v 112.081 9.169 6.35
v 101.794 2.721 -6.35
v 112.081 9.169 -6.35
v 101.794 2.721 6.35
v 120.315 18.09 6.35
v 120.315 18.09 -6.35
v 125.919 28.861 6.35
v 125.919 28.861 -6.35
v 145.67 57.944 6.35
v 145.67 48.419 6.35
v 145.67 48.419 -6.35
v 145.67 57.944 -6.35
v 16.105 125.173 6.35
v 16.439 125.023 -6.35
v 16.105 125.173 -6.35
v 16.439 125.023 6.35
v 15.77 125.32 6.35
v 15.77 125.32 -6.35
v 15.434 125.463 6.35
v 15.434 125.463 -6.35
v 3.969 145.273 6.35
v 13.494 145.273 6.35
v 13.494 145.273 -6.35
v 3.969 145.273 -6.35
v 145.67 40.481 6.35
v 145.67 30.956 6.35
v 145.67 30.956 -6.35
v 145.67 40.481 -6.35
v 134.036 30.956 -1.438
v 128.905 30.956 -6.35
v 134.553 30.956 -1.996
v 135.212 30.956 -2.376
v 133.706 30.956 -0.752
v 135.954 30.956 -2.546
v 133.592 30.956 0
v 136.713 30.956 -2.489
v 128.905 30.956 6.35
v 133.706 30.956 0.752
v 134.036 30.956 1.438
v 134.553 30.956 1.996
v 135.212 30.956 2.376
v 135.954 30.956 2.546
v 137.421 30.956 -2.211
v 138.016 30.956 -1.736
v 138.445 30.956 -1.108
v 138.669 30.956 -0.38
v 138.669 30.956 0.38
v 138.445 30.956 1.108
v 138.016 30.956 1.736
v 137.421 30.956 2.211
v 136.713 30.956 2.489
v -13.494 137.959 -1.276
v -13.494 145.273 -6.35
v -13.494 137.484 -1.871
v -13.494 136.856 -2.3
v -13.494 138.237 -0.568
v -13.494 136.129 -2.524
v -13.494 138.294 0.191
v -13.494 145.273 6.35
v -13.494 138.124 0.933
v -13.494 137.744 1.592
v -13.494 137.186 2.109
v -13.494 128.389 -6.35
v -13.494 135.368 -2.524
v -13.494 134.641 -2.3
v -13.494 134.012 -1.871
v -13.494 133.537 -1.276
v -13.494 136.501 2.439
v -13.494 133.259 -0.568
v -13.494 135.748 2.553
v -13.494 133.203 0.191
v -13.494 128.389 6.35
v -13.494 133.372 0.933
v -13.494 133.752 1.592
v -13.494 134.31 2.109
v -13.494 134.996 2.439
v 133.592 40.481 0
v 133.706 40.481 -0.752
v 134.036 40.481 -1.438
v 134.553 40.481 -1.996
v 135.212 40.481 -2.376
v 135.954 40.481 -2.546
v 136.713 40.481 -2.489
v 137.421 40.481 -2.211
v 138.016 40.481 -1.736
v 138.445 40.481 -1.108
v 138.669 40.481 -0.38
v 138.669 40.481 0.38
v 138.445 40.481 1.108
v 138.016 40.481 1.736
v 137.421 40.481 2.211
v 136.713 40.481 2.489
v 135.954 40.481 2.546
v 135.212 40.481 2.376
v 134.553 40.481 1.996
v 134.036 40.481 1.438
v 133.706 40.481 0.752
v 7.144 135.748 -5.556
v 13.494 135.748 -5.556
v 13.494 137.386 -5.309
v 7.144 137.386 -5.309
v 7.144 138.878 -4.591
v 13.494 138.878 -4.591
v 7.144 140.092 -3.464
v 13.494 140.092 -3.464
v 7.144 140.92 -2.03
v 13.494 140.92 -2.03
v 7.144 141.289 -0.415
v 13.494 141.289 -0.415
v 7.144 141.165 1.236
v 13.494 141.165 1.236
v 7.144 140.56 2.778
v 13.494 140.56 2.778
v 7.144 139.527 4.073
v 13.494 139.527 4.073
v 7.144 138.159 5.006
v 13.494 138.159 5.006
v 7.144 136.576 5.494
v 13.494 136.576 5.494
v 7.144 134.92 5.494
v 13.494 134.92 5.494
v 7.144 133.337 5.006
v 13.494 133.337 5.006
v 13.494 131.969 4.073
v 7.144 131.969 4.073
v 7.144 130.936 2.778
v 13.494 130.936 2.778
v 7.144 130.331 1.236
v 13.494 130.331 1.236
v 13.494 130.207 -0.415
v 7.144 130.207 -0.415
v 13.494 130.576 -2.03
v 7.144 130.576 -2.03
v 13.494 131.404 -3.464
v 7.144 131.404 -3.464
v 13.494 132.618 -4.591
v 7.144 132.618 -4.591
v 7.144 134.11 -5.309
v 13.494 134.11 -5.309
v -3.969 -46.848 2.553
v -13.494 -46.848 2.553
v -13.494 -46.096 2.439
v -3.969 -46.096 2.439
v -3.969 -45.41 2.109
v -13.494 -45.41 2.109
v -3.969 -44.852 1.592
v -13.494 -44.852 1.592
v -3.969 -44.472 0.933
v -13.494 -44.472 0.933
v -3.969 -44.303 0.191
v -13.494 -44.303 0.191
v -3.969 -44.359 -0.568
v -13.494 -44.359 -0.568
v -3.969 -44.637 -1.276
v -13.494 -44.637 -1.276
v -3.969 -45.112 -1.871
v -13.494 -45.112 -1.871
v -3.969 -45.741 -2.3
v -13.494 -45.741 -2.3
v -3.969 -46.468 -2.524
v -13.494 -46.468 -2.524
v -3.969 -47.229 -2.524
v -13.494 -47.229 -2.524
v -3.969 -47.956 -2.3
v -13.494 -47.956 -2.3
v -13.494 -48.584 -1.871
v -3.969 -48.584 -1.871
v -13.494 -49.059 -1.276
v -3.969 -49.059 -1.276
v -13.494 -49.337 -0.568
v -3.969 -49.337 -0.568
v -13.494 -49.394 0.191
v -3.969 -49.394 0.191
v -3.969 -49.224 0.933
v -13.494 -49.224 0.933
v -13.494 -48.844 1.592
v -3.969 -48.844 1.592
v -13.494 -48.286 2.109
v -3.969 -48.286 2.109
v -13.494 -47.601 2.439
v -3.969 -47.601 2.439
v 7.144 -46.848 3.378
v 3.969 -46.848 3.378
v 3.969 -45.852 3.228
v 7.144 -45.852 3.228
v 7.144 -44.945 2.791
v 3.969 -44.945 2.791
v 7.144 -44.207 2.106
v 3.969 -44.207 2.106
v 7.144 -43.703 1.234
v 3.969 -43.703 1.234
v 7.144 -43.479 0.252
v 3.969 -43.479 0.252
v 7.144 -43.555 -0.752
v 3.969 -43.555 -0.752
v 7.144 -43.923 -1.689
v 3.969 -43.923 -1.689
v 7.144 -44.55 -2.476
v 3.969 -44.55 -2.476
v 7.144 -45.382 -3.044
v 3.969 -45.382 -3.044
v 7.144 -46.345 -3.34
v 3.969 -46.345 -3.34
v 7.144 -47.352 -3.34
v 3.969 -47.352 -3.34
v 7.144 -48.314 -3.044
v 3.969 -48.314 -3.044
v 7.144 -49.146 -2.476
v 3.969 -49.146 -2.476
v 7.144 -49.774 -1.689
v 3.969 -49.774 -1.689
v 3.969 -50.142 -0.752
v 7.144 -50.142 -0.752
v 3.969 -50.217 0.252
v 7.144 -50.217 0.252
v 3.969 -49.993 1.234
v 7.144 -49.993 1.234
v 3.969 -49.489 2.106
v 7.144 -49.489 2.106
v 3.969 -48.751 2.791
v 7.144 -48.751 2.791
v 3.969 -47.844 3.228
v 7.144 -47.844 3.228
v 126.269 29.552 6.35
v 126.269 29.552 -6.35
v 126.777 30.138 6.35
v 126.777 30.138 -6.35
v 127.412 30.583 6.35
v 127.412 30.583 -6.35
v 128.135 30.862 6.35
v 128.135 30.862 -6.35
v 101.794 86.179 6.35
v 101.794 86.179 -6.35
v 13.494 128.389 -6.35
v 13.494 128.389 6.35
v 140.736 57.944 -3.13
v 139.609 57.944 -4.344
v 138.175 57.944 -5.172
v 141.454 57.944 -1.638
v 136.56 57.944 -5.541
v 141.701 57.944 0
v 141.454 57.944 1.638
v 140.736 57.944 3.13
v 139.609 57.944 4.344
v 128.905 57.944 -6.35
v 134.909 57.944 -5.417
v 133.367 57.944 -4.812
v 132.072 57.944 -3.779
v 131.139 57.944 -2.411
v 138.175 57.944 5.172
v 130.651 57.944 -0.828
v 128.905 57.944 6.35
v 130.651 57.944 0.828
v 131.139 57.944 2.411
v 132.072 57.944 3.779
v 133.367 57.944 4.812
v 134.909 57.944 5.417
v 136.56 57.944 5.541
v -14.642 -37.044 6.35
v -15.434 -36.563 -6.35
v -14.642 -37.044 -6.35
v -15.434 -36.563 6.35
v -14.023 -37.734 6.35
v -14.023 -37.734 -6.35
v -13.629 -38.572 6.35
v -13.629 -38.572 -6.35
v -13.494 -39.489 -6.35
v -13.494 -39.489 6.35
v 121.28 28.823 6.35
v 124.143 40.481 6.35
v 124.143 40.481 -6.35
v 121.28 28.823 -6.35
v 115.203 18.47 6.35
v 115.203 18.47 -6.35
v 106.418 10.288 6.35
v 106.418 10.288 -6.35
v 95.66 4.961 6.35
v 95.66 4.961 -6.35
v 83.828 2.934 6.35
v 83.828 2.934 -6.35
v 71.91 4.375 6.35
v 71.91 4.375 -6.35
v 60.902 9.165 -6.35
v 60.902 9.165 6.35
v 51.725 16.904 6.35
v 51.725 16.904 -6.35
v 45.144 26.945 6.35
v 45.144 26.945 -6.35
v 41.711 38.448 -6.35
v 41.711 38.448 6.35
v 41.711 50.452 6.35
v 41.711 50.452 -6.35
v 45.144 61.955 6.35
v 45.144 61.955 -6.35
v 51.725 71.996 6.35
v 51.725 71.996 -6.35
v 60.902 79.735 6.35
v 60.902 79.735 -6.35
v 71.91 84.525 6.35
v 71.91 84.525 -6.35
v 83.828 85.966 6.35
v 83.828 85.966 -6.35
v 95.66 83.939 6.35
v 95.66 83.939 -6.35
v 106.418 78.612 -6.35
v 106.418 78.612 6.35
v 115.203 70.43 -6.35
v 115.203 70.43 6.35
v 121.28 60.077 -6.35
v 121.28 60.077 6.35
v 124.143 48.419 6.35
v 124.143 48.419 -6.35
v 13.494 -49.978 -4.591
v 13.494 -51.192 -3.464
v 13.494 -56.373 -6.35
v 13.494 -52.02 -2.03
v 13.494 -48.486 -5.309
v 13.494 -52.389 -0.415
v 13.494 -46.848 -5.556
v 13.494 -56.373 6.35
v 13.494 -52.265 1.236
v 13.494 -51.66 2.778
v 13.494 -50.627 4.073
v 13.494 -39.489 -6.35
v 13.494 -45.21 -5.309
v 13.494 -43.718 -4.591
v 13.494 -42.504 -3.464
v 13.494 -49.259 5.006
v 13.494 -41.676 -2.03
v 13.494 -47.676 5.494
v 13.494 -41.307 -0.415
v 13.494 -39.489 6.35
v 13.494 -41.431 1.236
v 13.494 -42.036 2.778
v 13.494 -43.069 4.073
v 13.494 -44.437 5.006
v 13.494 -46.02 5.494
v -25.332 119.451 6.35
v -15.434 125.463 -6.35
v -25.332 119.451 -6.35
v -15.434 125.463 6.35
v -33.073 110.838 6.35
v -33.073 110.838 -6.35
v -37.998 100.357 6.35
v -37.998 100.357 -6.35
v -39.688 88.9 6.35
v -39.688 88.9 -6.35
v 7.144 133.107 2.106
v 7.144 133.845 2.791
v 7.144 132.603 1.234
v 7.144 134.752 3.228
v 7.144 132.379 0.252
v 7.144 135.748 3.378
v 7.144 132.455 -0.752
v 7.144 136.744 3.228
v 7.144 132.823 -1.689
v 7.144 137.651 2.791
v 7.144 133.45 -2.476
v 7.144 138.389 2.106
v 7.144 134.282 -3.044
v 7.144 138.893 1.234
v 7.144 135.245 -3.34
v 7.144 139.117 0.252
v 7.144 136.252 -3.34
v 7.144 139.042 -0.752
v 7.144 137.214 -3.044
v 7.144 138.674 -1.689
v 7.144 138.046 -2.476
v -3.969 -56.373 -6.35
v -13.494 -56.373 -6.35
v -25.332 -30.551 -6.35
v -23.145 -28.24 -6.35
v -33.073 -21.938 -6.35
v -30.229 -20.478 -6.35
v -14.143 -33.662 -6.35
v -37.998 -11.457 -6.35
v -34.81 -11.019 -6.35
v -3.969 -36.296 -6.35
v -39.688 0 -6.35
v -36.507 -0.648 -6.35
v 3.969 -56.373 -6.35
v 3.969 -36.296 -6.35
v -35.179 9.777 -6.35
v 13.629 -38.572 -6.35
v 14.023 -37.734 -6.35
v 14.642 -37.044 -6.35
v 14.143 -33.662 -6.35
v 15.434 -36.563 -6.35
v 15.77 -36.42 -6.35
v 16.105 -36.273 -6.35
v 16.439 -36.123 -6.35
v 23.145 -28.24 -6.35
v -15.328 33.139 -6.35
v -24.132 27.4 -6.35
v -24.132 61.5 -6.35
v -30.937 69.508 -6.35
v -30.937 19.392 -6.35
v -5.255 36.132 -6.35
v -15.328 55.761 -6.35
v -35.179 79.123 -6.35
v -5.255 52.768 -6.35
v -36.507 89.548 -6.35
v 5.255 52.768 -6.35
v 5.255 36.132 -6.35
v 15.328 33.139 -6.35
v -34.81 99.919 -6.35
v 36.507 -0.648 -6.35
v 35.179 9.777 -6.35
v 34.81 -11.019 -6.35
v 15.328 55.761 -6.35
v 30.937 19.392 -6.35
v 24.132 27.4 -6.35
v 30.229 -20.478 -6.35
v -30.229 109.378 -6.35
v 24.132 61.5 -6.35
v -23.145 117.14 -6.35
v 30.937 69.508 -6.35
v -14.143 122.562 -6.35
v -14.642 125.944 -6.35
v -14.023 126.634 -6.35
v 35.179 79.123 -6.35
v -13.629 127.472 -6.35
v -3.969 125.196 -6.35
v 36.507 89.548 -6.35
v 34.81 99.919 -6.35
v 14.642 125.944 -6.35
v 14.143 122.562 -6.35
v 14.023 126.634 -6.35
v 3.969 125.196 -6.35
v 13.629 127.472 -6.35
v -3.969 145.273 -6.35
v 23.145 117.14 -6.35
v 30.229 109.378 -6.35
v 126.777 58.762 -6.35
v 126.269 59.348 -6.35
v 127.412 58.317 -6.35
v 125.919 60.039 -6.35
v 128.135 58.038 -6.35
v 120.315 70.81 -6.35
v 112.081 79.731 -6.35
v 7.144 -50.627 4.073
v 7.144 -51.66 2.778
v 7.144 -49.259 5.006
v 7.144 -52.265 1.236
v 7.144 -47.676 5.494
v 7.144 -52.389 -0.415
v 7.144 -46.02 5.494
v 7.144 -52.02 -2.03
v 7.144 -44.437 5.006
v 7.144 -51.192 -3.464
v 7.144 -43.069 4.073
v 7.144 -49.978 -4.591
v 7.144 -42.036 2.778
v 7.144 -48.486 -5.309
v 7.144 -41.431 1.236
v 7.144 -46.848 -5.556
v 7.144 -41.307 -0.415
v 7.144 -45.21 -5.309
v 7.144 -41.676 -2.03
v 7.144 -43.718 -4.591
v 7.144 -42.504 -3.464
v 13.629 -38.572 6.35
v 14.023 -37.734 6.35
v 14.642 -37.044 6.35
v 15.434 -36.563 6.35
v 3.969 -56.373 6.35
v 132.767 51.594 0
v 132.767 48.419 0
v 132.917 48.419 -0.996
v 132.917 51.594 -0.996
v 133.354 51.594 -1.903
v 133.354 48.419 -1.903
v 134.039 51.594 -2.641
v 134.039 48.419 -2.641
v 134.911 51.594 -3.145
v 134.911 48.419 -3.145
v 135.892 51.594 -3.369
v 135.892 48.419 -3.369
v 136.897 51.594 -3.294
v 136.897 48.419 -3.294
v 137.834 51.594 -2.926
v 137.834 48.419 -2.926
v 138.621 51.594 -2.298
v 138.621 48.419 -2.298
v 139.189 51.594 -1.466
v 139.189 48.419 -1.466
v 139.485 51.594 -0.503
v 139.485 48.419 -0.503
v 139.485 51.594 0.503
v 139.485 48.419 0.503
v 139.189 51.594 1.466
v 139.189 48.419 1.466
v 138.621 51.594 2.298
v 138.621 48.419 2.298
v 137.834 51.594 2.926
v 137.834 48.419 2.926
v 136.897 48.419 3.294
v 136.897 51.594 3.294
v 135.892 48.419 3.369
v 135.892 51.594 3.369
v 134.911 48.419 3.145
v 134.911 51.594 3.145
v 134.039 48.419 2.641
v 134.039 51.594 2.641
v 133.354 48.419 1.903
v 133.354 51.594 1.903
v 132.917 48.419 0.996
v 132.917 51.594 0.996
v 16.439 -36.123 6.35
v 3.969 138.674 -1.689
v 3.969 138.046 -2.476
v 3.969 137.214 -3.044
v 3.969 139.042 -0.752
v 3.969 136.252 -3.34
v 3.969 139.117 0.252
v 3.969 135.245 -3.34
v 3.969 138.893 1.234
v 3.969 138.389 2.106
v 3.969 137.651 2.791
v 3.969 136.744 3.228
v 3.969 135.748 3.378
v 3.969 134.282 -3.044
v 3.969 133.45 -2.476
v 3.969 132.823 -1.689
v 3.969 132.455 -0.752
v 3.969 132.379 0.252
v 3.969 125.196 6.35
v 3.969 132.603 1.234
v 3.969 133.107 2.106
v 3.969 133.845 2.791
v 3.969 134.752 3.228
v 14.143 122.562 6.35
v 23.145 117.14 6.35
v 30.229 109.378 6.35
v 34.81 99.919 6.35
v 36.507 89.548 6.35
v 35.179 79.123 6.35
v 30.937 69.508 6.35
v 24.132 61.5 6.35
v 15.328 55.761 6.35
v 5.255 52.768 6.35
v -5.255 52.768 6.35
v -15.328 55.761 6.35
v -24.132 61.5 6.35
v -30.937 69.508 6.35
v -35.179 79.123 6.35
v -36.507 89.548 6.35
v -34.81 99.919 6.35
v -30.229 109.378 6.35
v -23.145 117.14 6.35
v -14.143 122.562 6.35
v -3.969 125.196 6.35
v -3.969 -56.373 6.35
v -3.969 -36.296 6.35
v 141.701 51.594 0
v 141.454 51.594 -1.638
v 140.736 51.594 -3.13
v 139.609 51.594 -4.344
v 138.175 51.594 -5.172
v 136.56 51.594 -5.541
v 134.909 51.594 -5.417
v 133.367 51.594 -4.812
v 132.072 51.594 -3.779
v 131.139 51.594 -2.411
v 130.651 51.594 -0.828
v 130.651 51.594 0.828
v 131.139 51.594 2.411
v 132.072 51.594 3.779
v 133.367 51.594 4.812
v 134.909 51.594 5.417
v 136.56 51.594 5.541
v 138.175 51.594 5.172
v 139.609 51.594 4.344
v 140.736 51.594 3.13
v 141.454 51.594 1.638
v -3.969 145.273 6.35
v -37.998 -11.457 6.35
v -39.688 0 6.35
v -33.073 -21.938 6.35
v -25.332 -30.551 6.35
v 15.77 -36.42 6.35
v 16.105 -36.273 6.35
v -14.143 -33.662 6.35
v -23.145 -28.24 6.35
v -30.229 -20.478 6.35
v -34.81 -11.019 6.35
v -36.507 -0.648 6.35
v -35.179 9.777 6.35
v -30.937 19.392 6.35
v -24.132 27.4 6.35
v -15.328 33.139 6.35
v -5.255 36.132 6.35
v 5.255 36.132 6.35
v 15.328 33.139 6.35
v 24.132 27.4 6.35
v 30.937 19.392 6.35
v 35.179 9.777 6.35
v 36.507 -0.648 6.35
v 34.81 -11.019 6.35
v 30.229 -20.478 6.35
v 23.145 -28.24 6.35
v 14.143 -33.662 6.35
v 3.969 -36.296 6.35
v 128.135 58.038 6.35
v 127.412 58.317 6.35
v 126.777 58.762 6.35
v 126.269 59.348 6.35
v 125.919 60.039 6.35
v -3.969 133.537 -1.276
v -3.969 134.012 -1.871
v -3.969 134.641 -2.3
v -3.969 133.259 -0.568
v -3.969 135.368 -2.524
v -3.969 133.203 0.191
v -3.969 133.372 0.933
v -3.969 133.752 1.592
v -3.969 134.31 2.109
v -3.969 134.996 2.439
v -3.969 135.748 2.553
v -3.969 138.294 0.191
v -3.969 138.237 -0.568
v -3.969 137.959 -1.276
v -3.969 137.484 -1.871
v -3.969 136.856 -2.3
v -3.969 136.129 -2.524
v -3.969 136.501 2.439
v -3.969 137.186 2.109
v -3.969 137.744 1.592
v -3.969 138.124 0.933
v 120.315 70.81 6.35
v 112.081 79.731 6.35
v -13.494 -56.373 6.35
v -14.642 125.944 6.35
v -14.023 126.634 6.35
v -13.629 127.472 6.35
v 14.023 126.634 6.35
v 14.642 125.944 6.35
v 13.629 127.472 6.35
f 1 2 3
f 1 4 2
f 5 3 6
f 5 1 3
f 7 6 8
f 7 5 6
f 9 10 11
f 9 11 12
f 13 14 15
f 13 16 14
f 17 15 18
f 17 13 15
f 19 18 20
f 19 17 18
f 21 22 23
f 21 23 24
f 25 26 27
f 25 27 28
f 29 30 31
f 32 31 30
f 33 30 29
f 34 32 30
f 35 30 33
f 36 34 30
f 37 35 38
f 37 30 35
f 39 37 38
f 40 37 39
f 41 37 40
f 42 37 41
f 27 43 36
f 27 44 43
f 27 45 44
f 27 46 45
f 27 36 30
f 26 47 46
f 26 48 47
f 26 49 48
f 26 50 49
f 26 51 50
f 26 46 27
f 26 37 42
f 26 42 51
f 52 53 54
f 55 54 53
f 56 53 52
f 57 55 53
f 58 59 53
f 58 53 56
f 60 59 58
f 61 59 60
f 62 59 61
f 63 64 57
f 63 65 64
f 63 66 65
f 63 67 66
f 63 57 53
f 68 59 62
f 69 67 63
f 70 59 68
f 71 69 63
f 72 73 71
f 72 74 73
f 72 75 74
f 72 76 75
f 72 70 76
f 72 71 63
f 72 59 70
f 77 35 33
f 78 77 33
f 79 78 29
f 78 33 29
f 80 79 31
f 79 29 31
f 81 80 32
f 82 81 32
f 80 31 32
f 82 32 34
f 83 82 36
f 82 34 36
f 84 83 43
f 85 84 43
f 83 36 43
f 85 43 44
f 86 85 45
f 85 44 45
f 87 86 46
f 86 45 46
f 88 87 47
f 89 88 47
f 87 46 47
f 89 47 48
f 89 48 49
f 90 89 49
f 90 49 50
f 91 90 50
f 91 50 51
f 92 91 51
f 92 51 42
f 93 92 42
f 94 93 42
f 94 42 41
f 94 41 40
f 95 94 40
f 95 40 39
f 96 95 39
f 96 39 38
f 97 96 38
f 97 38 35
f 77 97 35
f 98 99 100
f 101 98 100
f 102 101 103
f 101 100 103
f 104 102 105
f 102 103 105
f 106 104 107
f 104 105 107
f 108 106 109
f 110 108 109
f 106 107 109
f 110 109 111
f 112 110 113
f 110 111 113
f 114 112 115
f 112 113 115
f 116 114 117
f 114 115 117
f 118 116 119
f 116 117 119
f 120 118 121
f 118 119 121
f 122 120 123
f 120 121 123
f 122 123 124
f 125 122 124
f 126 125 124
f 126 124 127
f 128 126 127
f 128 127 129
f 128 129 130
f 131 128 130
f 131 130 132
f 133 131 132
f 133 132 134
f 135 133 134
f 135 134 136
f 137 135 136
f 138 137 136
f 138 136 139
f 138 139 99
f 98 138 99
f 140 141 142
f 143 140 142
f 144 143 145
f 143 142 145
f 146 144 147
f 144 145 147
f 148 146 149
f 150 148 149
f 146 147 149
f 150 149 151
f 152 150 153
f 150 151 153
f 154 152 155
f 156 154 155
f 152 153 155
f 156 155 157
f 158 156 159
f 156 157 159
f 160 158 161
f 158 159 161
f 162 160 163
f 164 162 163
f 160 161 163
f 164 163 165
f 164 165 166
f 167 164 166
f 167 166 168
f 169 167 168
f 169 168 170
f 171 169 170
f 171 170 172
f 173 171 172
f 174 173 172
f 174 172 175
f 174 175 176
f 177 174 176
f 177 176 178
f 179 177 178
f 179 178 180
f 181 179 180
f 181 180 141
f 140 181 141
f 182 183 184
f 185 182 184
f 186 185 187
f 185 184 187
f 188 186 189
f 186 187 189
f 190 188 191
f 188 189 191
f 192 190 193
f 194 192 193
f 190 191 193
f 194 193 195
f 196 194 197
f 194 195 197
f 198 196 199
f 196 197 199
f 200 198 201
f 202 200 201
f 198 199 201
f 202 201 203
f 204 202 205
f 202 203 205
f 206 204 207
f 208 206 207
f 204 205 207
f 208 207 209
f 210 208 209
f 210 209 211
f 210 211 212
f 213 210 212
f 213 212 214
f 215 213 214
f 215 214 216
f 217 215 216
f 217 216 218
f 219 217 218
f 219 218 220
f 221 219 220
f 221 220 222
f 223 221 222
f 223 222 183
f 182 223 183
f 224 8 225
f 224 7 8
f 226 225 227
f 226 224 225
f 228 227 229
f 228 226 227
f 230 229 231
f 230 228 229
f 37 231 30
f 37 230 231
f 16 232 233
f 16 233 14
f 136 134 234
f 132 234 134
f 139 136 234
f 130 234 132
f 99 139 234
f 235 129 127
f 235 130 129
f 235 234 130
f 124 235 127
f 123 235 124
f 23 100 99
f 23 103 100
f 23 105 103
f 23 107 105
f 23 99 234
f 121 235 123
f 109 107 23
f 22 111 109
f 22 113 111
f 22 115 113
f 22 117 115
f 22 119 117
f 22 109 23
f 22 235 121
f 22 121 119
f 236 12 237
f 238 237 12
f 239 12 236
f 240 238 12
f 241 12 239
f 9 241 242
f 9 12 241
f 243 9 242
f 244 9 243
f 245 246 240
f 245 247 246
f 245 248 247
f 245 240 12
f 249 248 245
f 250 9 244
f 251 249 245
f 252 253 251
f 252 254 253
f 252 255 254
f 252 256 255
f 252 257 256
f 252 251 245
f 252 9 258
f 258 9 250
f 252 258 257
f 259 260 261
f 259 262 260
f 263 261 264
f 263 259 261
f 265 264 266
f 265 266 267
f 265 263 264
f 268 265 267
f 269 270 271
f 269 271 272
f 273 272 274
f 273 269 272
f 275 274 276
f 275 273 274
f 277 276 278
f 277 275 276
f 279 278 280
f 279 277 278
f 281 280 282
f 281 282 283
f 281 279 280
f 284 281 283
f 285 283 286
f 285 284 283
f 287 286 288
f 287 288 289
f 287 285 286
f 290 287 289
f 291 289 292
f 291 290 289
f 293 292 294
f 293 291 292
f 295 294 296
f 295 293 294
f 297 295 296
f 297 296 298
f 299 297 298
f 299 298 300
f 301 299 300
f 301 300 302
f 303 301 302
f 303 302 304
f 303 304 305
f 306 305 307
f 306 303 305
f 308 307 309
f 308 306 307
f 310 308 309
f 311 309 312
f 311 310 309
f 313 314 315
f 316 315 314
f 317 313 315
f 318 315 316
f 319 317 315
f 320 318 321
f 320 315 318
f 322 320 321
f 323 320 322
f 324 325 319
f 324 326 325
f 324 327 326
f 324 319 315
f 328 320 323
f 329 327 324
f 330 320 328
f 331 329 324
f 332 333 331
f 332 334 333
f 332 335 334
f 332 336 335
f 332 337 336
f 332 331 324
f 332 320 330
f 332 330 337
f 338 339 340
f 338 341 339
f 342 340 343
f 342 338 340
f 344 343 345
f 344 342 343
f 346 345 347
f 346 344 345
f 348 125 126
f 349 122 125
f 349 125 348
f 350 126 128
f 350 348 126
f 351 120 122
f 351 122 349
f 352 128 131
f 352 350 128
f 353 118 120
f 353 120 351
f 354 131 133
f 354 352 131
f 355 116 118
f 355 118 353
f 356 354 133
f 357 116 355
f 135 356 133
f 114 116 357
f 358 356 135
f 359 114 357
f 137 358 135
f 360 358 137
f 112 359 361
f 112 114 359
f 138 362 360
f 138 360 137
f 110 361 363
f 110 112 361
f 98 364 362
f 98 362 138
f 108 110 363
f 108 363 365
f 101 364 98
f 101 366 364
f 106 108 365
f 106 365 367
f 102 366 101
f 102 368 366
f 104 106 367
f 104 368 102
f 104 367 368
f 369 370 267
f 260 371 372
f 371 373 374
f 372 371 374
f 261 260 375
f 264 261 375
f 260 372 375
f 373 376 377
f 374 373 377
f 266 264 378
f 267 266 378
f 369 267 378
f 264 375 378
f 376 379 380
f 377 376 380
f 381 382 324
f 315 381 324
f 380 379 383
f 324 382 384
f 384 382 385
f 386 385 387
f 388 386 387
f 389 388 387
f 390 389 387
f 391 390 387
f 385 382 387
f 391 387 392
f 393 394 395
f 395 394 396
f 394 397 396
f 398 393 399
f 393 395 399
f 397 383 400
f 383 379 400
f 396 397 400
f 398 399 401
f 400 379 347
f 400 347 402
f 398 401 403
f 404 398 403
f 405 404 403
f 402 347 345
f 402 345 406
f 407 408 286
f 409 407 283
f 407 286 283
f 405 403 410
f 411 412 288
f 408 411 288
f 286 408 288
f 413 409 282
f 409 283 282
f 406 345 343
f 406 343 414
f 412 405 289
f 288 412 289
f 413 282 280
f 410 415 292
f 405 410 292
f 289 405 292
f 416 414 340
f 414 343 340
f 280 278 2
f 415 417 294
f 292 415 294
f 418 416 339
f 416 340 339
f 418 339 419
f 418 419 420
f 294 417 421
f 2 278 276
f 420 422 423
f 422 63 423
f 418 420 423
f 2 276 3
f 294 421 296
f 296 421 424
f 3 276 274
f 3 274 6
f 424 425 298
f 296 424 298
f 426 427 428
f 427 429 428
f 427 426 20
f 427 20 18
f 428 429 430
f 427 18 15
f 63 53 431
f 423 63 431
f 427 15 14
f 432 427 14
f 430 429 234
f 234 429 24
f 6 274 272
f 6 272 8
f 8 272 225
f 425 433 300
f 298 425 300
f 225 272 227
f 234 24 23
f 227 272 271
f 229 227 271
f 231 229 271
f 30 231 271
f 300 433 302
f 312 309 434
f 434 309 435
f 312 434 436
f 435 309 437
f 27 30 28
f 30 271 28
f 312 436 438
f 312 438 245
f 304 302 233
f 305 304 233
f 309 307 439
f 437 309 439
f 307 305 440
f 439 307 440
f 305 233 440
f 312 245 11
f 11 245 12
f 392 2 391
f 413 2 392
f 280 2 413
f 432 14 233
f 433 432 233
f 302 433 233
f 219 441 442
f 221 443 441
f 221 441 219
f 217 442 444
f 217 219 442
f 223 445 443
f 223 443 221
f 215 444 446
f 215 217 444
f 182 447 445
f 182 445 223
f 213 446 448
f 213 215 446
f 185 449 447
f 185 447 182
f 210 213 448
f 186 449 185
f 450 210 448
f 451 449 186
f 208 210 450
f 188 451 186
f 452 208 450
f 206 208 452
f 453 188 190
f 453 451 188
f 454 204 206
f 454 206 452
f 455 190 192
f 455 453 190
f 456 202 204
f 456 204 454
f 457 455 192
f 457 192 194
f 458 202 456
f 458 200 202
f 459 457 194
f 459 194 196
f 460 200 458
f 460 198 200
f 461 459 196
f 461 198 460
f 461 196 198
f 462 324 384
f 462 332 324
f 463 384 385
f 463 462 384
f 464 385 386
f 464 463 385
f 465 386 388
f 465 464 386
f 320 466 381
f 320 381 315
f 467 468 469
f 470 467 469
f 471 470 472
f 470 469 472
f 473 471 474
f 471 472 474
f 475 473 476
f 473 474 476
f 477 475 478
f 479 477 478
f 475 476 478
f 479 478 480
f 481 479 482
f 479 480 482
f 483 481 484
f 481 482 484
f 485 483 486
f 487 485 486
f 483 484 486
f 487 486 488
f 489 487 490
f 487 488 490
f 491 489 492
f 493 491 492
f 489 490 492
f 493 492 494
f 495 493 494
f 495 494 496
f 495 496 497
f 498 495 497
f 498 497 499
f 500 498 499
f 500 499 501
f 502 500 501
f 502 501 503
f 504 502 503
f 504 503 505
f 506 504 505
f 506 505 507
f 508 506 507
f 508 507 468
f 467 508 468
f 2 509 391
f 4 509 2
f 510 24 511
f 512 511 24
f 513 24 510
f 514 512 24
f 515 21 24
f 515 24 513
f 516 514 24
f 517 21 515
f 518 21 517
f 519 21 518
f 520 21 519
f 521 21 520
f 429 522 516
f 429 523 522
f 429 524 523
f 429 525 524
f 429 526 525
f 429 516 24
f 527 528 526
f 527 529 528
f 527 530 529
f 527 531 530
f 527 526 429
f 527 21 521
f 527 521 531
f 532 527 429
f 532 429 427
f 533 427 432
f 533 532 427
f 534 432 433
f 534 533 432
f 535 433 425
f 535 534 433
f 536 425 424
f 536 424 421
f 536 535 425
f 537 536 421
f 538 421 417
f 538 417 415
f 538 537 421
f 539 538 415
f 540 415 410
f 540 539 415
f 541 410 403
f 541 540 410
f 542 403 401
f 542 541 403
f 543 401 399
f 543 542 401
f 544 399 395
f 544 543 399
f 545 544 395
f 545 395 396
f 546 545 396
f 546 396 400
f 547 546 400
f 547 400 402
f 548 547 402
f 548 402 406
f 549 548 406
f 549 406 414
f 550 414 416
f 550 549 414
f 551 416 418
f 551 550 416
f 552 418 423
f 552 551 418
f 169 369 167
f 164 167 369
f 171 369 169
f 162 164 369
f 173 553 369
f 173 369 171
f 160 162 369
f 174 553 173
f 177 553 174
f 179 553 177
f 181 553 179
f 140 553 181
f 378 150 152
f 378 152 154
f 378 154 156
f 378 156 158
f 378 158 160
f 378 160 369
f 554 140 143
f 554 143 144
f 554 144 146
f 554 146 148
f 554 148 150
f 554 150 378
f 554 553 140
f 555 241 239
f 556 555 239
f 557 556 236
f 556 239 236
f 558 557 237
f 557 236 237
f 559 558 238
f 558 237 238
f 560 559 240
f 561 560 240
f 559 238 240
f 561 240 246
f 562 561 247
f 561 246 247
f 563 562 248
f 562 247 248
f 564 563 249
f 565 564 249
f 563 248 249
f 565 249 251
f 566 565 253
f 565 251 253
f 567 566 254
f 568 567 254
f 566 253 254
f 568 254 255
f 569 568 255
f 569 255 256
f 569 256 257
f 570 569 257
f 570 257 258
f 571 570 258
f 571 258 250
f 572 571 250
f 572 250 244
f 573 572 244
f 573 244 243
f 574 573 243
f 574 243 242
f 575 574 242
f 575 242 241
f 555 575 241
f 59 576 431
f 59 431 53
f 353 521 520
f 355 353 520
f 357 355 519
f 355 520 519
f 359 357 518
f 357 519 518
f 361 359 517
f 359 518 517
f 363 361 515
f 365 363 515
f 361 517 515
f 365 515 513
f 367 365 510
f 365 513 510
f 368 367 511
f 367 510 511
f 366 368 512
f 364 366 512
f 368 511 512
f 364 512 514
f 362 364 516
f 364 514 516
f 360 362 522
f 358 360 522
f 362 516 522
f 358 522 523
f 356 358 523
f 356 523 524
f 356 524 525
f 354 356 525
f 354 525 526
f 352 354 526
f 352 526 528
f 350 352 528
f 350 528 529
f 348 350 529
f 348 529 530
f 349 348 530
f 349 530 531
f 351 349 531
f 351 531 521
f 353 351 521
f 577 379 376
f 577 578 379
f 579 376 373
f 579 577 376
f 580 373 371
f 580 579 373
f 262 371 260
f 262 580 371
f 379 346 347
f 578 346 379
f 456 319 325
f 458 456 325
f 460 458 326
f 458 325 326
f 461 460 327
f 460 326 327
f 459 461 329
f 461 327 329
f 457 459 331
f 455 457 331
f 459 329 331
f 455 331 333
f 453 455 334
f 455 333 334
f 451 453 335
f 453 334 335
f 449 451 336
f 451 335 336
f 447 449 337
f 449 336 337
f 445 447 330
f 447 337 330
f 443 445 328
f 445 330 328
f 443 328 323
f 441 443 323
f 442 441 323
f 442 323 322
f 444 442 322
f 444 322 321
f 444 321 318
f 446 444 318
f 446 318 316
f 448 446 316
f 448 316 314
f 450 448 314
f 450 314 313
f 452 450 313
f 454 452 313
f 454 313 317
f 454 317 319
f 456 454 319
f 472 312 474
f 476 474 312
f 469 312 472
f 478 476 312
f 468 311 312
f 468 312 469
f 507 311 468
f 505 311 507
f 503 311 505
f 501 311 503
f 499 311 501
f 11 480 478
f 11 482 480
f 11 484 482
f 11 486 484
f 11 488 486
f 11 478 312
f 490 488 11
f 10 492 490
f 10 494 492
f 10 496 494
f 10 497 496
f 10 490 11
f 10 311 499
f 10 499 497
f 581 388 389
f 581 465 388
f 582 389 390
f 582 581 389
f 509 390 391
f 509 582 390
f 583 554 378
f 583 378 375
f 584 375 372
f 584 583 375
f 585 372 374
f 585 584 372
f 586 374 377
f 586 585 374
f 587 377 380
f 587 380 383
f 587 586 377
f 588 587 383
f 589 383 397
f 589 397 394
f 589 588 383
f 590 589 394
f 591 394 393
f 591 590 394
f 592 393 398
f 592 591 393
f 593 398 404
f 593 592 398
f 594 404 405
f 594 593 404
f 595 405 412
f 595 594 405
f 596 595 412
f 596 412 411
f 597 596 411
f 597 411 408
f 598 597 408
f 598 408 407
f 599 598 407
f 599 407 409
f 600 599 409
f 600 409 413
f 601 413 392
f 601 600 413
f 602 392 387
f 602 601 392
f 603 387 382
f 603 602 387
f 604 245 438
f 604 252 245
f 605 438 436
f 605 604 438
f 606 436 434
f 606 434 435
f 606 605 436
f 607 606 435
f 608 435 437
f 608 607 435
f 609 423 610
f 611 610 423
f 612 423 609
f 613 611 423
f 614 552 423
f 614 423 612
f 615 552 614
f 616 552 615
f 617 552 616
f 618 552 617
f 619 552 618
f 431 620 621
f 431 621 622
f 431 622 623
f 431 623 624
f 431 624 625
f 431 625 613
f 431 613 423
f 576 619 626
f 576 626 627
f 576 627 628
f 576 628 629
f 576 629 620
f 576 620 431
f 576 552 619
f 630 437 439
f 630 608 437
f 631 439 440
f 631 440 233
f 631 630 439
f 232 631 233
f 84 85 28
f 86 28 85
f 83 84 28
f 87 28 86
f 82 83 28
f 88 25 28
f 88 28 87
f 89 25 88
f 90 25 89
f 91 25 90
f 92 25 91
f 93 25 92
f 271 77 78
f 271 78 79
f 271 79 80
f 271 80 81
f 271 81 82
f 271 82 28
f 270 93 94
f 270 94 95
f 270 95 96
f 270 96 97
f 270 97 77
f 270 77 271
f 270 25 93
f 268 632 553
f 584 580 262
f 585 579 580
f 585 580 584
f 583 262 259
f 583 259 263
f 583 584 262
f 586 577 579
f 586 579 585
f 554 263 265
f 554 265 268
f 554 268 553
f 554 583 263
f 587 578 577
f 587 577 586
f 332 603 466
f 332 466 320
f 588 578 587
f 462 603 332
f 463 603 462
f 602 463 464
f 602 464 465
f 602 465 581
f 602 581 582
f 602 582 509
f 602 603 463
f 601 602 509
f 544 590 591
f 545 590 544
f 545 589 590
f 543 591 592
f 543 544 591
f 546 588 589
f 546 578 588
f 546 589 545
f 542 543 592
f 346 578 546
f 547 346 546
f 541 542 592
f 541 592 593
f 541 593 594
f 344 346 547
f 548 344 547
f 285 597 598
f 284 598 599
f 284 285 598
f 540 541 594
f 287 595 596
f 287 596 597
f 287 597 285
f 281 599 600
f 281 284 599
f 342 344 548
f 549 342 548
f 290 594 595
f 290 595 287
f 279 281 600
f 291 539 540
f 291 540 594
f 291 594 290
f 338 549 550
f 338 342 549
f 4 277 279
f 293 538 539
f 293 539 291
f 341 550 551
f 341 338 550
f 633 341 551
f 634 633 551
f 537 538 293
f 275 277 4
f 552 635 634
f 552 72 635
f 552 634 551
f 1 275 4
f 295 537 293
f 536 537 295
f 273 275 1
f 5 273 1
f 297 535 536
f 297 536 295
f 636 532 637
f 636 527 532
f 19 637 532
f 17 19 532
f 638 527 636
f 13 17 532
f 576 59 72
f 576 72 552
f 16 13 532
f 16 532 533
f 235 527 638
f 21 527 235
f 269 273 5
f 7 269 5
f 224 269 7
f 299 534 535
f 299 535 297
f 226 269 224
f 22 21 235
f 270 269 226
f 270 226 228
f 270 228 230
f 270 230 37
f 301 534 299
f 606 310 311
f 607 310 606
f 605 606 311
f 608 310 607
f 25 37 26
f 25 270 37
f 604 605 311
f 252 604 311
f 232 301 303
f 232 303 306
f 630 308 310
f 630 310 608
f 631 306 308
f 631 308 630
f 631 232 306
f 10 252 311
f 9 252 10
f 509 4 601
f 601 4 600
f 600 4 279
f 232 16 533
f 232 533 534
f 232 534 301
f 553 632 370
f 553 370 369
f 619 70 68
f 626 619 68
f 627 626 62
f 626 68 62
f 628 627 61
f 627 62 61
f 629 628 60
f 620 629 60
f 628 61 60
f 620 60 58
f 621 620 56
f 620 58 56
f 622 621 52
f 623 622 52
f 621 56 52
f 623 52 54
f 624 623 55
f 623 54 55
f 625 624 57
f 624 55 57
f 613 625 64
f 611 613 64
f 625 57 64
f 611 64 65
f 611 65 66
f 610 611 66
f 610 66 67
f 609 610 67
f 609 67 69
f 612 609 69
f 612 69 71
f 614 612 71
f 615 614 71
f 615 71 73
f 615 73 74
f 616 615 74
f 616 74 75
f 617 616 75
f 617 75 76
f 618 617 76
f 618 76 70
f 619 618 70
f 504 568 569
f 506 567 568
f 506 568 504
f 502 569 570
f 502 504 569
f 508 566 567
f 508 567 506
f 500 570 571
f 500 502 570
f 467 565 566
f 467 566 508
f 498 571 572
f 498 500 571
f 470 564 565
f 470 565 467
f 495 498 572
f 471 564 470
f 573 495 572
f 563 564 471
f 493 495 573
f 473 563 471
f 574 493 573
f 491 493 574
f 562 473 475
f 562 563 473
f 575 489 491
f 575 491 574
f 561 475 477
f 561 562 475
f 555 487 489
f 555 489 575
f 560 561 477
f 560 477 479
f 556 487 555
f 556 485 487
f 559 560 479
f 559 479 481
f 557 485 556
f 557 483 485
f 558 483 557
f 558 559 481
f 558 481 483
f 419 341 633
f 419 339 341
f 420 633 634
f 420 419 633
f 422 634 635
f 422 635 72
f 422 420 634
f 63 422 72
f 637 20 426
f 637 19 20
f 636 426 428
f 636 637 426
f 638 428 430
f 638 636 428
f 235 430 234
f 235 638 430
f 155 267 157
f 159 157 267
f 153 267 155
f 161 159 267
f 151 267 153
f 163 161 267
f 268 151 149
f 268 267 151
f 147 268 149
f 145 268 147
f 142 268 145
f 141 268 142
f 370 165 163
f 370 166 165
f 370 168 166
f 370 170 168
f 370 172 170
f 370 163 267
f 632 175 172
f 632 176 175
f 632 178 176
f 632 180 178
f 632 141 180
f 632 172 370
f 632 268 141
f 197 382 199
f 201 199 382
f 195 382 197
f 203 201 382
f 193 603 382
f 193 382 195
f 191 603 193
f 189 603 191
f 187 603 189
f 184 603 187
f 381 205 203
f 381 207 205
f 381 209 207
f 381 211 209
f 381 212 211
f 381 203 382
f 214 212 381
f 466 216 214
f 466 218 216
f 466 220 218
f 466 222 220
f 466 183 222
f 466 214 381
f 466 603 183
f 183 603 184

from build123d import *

# Parameters (mm, degrees)
EXTRUDE1_DEPTH                                   = 6.35
CBORE_FOR_1_4_SOCKET_HEAD_CAP_SCREW1_D           = 6.7564
CBORE_FOR_1_4_SOCKET_HEAD_CAP_SCREW1_DEPTH       = 9.525
CBORE_FOR_1_4_SOCKET_HEAD_CAP_SCREW1_CBORE_D     = 11.1125
CBORE_FOR_1_4_SOCKET_HEAD_CAP_SCREW1_CBORE_DEPTH = 6.35
F_1_4_20_TAPPED_HOLE1_D                          = 5.1054
CBORE_FOR_1_4_SOCKET_HEAD_CAP_SCREW3_D           = 6.7564
CBORE_FOR_1_4_SOCKET_HEAD_CAP_SCREW3_DEPTH       = 9.525
CBORE_FOR_1_4_SOCKET_HEAD_CAP_SCREW3_CBORE_D     = 11.1125
CBORE_FOR_1_4_SOCKET_HEAD_CAP_SCREW3_CBORE_DEPTH = 6.35
F_1_4_20_TAPPED_HOLE4_D                          = 5.1054
CBORE_FOR_1_4_SOCKET_HEAD_CAP_SCREW6_D           = 6.7564
CBORE_FOR_1_4_SOCKET_HEAD_CAP_SCREW6_DEPTH       = 9.525
CBORE_FOR_1_4_SOCKET_HEAD_CAP_SCREW6_CBORE_D     = 11.1125
CBORE_FOR_1_4_SOCKET_HEAD_CAP_SCREW6_CBORE_DEPTH = 6.35
F_1_4_20_TAPPED_HOLE7_D                          = 5.1054
FILLET1_R                                        = 3.175


with BuildPart() as part:
    # Sketch1 → Extrude1 (new, symmetric)
    with BuildSketch(Plane.XY):
        with BuildLine():
            Line((-39.6875, 88.9), (-39.6875, 0))
            ThreePointArc((-39.6875, 0), (-32.485618813, -22.798733003), (-13.49375, -37.323134477))
            Line((-13.49375, -37.323134477), (-13.49375, -56.373134477))
            Line((-13.49375, -56.373134477), (-3.96875, -56.373134477))
            Line((-3.96875, -56.373134477), (-3.96875, -36.296166184))
            ThreePointArc((-3.96875, -36.296166184), (0, 36.5125), (3.96875, -36.296166184))
            Line((3.96875, -36.296166184), (3.96875, -56.373134477))
            Line((3.96875, -56.373134477), (13.49375, -56.373134477))
            Line((13.49375, -56.373134477), (13.49375, -37.323134477))
            ThreePointArc((13.49375, -37.323134477), (14.978378625, -36.752494201), (16.438950589, -36.122826022))
            Line((16.438950589, -36.122826022), (101.793886149, 2.72091138))
            ThreePointArc((101.793886149, 2.72091138), (117.234328534, 14.176693941), (126.619887312, 30.95625))
            Line((126.619887312, 30.95625), (145.669887312, 30.95625))
            Line((145.669887312, 30.95625), (145.669887312, 40.48125))
            Line((145.669887312, 40.48125), (124.142537174, 40.48125))
            ThreePointArc((124.142537174, 40.48125), (41.274610429, 44.45), (124.142537174, 48.41875))
            Line((124.142537174, 48.41875), (145.669887312, 48.41875))
            Line((145.669887312, 48.41875), (145.669887312, 57.94375))
            Line((145.669887312, 57.94375), (126.619887312, 57.94375))
            ThreePointArc((126.619887312, 57.94375), (117.234328534, 74.723306059), (101.793886149, 86.17908862))
            Line((101.793886149, 86.17908862), (16.438950589, 125.022826022))
            ThreePointArc((16.438950589, 125.022826022), (14.978378625, 125.652494201), (13.49375, 126.223134477))
            Line((13.49375, 126.223134477), (13.49375, 145.273134477))
            Line((13.49375, 145.273134477), (3.96875, 145.273134477))
            Line((3.96875, 145.273134477), (3.96875, 125.196166184))
            ThreePointArc((3.96875, 125.196166184), (0, 52.3875), (-3.96875, 125.196166184))
            Line((-3.96875, 125.196166184), (-3.96875, 145.273134477))
            Line((-3.96875, 145.273134477), (-13.49375, 145.273134477))
            Line((-13.49375, 145.273134477), (-13.49375, 126.223134477))
            ThreePointArc((-13.49375, 126.223134477), (-32.485618813, 111.698733003), (-39.6875, 88.9))
        make_face()
    extrude(amount=EXTRUDE1_DEPTH, both=True)

    # CBORE for 1/4 Socket Head Cap Screw1
    with Locations(Plane(origin=(13.49375, 0, 0), x_dir=(0, 0, -1), z_dir=(1, 0, 0))):
        with Locations((0, 135.748134477)):
            CounterBoreHole(CBORE_FOR_1_4_SOCKET_HEAD_CAP_SCREW1_D / 2, CBORE_FOR_1_4_SOCKET_HEAD_CAP_SCREW1_CBORE_D / 2, CBORE_FOR_1_4_SOCKET_HEAD_CAP_SCREW1_CBORE_DEPTH, depth=CBORE_FOR_1_4_SOCKET_HEAD_CAP_SCREW1_DEPTH)

    # 1/4-20 Tapped Hole1 (through all)
    with Locations(Plane(origin=(-3.96875, 0, 0), x_dir=(0, 0, -1), z_dir=(1, 0, 0))):
        with Locations((0, 135.748134477)):
            Hole(F_1_4_20_TAPPED_HOLE1_D / 2)

    # CBORE for 1/4 Socket Head Cap Screw3
    with Locations(Plane(origin=(13.49375, 0, 0), x_dir=(0, 0, -1), z_dir=(1, 0, 0))):
        with Locations((0, -46.848134477)):
            CounterBoreHole(CBORE_FOR_1_4_SOCKET_HEAD_CAP_SCREW3_D / 2, CBORE_FOR_1_4_SOCKET_HEAD_CAP_SCREW3_CBORE_D / 2, CBORE_FOR_1_4_SOCKET_HEAD_CAP_SCREW3_CBORE_DEPTH, depth=CBORE_FOR_1_4_SOCKET_HEAD_CAP_SCREW3_DEPTH)

    # 1/4-20 Tapped Hole4 (through all)
    with Locations(Plane(origin=(-3.96875, 0, 0), x_dir=(0, 0, -1), z_dir=(1, 0, 0))):
        with Locations((0, -46.848134477)):
            Hole(F_1_4_20_TAPPED_HOLE4_D / 2)

    # CBORE for 1/4 Socket Head Cap Screw6
    with Locations(Plane(origin=(0, 57.94375, 0), x_dir=(1, 0, 0), z_dir=(0, 1, 0))):
        with Locations((136.144887312, 0)):
            CounterBoreHole(CBORE_FOR_1_4_SOCKET_HEAD_CAP_SCREW6_D / 2, CBORE_FOR_1_4_SOCKET_HEAD_CAP_SCREW6_CBORE_D / 2, CBORE_FOR_1_4_SOCKET_HEAD_CAP_SCREW6_CBORE_DEPTH, depth=CBORE_FOR_1_4_SOCKET_HEAD_CAP_SCREW6_DEPTH)

    # 1/4-20 Tapped Hole7 (through all)
    with Locations(Plane(origin=(0, 40.48125, 0), x_dir=(1, 0, 0), z_dir=(0, 1, 0))):
        with Locations((136.144887312, 0)):
            Hole(F_1_4_20_TAPPED_HOLE7_D / 2)

    # Fillet1
    fillet1_edges = [part.edges().sort_by_distance(p)[0] for p in [
        (-13.49375, 126.223134477, 0),
        (13.49375, 126.223134477, 0),
        (126.619887312, 57.94375, 0),
        (126.619887312, 30.95625, 0),
        (13.49375, -37.323134477, 0),
        (-13.49375, -37.323134477, 0),
    ]]
    fillet(fillet1_edges, radius=FILLET1_R)


solid = part.part
